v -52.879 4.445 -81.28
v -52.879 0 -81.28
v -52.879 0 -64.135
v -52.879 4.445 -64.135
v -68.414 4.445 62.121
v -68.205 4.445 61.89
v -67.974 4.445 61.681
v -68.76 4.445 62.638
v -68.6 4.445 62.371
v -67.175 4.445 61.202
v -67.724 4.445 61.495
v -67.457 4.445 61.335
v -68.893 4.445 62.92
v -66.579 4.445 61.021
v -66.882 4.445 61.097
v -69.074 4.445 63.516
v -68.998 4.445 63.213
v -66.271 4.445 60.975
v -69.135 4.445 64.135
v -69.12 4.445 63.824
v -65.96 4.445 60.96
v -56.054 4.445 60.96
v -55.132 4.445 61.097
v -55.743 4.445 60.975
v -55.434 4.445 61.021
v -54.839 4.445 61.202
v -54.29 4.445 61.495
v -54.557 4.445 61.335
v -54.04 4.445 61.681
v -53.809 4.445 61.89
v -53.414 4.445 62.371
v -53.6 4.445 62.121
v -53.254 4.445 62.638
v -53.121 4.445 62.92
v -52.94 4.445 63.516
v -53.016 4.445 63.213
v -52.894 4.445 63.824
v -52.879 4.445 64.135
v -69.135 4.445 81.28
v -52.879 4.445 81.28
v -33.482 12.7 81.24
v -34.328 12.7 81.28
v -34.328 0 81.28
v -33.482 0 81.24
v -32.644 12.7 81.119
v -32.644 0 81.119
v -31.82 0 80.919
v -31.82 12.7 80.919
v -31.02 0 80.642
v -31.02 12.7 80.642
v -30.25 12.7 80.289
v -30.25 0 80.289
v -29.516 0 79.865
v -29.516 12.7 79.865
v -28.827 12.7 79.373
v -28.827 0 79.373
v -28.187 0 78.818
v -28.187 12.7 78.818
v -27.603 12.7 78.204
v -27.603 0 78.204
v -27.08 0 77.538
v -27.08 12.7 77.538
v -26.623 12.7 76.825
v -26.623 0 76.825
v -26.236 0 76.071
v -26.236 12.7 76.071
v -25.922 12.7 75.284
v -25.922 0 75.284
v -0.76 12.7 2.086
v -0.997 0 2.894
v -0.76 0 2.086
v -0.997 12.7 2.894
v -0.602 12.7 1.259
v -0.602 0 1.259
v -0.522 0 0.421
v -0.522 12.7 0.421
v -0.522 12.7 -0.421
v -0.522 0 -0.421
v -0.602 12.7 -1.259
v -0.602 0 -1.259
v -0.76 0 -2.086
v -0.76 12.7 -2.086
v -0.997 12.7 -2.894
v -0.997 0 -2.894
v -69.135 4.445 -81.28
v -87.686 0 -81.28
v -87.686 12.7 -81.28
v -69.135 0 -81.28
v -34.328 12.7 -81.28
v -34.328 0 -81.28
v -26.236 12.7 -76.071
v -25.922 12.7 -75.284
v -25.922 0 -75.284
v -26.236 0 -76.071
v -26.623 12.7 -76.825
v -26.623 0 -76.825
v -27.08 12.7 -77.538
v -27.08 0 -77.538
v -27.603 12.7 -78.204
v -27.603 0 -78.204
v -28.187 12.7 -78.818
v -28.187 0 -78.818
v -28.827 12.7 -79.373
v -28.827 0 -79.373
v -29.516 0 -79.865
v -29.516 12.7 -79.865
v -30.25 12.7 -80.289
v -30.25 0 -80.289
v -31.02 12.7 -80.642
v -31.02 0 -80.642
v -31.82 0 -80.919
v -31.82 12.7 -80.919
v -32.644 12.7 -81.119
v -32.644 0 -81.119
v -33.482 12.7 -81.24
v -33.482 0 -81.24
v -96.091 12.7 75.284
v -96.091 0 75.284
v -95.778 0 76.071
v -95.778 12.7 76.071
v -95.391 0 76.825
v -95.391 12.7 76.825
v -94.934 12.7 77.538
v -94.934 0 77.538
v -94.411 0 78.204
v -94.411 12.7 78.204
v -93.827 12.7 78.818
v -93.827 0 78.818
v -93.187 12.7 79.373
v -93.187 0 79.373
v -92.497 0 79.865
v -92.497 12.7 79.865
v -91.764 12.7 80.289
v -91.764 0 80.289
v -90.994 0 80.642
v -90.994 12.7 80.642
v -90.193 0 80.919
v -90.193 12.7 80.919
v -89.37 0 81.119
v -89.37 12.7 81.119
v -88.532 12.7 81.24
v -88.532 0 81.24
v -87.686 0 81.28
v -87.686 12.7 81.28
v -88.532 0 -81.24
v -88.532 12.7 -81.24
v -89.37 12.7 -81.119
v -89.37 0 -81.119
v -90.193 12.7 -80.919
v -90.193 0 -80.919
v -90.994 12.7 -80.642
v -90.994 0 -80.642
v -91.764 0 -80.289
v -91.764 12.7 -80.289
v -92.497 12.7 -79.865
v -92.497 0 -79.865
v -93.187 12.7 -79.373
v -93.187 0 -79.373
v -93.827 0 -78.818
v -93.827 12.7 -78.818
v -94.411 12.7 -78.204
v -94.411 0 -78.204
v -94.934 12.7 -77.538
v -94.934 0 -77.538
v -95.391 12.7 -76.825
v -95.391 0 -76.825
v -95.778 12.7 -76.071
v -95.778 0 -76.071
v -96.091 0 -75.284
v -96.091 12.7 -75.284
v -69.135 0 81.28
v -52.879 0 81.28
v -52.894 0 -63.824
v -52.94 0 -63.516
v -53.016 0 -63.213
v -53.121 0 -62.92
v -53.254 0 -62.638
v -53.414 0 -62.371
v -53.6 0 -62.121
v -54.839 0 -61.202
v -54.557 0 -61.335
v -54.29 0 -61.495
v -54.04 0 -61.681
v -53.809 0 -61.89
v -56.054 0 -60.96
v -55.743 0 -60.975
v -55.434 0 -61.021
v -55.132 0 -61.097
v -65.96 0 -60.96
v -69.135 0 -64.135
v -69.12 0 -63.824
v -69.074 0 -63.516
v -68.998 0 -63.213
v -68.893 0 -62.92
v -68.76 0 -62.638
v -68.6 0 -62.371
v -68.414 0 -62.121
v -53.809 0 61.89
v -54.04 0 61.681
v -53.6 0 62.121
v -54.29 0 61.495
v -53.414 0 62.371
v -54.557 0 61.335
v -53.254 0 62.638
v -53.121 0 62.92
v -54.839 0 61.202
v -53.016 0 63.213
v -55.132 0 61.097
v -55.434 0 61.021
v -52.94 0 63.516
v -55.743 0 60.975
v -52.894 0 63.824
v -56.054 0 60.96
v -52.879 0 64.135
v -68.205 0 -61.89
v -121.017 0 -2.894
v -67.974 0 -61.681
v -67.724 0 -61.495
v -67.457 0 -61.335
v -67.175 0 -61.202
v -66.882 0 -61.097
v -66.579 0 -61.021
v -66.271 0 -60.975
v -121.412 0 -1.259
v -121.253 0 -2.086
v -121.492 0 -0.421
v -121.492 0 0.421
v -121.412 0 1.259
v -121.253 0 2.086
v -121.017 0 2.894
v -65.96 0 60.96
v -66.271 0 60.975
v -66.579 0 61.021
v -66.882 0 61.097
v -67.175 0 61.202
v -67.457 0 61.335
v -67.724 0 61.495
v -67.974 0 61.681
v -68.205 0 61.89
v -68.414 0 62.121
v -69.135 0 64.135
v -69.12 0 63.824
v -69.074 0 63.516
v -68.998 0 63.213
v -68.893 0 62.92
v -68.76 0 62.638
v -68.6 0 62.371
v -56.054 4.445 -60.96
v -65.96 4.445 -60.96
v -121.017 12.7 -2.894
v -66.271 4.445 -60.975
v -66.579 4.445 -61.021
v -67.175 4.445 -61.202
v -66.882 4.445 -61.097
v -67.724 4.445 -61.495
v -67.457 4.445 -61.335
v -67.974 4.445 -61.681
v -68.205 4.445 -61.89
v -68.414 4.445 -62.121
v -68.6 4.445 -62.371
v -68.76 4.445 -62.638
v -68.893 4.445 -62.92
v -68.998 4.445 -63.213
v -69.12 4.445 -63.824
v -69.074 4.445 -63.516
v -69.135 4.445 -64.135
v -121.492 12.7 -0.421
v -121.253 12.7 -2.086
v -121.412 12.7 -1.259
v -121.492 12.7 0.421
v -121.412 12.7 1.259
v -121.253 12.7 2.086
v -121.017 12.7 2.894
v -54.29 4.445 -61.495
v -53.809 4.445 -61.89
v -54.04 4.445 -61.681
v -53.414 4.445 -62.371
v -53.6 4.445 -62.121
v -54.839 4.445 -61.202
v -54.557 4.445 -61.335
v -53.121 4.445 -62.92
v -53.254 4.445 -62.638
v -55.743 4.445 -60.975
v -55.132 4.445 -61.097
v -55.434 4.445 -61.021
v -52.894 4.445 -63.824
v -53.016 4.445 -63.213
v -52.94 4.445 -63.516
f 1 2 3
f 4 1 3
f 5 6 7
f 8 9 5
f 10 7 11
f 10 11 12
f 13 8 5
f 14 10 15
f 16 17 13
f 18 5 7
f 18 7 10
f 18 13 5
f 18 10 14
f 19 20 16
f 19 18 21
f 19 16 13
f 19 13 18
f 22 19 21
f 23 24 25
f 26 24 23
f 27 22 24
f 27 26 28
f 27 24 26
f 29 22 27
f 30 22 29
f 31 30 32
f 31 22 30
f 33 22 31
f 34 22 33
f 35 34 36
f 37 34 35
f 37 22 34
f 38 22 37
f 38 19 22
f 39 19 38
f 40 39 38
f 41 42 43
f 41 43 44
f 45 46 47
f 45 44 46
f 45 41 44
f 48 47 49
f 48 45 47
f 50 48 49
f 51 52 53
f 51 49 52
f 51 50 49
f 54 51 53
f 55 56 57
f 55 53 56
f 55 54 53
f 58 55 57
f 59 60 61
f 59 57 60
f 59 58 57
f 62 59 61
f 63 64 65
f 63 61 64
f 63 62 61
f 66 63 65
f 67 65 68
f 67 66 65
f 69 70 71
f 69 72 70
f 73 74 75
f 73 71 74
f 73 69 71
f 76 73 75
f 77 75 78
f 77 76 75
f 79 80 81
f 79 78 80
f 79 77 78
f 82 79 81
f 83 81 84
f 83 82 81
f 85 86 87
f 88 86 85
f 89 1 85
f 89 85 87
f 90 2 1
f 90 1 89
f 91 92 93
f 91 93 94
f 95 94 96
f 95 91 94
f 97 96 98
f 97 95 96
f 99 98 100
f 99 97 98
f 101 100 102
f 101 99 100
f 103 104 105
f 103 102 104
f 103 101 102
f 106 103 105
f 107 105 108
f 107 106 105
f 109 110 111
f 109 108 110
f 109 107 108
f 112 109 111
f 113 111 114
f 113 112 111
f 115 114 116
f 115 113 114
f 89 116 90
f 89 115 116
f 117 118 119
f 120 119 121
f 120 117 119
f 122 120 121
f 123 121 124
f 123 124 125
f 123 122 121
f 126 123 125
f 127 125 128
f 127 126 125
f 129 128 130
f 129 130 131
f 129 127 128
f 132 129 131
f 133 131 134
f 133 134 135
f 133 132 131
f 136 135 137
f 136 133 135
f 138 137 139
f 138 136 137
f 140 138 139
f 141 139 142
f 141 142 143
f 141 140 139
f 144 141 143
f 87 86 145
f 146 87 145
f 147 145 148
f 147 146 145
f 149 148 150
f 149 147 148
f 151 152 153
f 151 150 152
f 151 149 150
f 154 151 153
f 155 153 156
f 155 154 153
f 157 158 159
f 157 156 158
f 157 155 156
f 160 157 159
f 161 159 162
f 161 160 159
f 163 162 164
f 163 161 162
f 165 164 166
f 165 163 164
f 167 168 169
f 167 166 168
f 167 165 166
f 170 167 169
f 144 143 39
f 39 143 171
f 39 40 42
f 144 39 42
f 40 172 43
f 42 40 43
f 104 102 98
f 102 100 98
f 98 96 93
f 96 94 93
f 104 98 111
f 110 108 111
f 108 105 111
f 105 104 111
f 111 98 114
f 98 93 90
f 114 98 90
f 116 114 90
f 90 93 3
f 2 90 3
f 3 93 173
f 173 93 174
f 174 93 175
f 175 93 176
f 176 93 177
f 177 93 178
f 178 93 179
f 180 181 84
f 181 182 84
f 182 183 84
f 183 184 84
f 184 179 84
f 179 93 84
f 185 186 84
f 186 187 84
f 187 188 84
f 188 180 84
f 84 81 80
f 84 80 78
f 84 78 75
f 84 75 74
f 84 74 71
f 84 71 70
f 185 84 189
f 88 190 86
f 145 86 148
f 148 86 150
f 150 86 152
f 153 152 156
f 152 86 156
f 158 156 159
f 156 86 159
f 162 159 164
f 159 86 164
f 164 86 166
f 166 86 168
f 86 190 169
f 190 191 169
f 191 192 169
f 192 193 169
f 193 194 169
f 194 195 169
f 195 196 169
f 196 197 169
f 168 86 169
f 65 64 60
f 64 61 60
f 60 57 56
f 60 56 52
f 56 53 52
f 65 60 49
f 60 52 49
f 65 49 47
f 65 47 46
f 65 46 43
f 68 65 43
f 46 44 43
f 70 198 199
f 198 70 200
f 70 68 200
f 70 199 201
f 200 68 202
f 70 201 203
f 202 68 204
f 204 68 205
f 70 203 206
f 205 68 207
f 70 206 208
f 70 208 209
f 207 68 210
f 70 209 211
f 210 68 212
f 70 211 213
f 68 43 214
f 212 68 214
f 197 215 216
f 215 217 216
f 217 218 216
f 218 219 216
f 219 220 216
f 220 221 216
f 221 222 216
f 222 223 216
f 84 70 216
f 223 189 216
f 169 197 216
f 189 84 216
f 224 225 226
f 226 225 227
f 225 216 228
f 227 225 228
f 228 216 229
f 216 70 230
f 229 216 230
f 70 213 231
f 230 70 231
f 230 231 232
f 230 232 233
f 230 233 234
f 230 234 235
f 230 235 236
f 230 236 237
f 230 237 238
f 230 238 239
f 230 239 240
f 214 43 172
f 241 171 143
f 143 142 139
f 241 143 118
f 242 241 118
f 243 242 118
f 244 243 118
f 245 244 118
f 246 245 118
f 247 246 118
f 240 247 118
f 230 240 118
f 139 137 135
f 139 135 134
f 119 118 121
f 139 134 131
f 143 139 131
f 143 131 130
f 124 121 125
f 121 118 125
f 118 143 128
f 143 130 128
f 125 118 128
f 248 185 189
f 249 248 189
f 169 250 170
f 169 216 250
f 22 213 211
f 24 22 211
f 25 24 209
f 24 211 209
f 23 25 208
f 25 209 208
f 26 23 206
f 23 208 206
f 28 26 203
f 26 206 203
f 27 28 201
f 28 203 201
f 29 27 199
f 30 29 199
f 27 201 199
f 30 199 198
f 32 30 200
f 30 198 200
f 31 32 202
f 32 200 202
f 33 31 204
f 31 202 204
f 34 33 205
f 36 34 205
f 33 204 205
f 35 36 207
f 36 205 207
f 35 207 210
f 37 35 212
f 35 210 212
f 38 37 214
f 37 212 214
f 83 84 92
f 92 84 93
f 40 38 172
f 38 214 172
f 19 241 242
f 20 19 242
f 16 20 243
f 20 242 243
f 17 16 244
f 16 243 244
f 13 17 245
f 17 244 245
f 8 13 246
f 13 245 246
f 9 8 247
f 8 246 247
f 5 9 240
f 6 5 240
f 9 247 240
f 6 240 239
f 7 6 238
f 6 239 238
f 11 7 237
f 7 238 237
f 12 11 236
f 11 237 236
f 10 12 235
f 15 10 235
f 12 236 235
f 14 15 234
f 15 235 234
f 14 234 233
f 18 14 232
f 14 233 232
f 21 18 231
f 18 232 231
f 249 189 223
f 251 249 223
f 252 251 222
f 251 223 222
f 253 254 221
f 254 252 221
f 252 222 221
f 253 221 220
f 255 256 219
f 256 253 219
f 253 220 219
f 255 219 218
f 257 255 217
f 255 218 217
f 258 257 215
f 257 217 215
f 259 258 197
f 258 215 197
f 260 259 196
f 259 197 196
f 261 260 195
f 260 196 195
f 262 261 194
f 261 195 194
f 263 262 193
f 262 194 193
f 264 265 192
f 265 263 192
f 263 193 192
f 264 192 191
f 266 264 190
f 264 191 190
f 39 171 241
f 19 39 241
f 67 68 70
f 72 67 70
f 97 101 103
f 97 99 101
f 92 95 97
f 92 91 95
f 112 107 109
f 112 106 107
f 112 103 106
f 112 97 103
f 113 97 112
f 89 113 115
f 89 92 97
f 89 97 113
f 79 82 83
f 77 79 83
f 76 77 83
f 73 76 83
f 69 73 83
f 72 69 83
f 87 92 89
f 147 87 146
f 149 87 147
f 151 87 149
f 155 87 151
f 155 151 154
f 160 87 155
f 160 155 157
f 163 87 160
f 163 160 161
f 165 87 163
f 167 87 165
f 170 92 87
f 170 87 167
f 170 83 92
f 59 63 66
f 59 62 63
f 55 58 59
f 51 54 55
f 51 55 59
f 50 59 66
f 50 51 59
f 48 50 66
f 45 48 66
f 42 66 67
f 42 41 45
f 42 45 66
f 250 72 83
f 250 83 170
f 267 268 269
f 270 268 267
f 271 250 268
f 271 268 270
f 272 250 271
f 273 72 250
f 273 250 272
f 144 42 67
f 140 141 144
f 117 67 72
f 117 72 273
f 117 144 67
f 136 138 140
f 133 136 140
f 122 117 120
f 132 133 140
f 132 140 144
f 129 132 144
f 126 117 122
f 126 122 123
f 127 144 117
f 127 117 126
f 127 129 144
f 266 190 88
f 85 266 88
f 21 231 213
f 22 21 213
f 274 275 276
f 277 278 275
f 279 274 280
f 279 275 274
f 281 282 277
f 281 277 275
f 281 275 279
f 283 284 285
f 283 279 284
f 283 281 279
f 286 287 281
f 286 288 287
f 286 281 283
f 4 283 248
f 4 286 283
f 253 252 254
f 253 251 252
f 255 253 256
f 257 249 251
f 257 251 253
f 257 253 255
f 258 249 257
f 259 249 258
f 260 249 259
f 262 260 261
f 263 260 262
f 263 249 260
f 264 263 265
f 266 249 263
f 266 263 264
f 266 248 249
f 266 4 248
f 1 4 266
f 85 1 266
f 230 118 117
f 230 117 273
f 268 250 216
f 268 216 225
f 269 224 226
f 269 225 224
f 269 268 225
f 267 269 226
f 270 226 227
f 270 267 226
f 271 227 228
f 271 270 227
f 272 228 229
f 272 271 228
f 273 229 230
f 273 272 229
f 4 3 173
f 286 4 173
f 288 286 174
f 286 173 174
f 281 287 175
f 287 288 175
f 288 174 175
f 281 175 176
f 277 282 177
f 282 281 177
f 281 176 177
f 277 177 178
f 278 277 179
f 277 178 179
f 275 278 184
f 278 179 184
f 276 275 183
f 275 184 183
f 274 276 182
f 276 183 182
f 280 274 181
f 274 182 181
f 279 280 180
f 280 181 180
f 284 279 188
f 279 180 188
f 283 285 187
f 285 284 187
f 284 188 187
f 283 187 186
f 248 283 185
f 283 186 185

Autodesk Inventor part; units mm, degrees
ref_plane "YZ Plane" through (0, 0, 0) normal (1, 0, 0) x (0, 1, 0)
ref_plane "XZ Plane" through (0, 0, 0) normal (0, 1, 0) x (-1, 0, 0)
ref_plane "XY Plane" through (0, 0, 0) normal (0, 0, 1) x (1, 0, 0)
sketch "Sketch1" plane through (0, 0, 0) normal (0, 1, 0) x (-1, 0, 0)
  line L0 (94.0269, 81.28) -> (27.9869, 81.28)
  line L1 (94.0269, -81.28) -> (27.9869, -81.28)
  line L2 (94.0269, 81.28) -> (122.0139, 0)
  line L3 (94.0269, 81.28) -> (179.9904, 81.28) construction
  line L4 (122.0139, 0) -> (94.0269, -81.28)
  line L5 (27.9869, 81.28) -> (0, 0)
  line L6 (27.9869, 81.28) -> (113.9504, 81.28) construction
  line L7 (0, 0) -> (27.9869, -81.28)
  dimension "d6" = 66.04
  dimension "d7" = 162.56
  dimension "d8" = 71
  dimension "d9" = 109
  dimension "d10" = 109
extrude "Extrusion1" add sketch "Sketch1" along normal blind 12.7
fillet "Fillet1" radius 8.89 6 edges at (-27.9869, 6.35, 81.28) (-94.0269, 6.35, 81.28) (0, 6.35, 0) (-27.9869, 6.35, -81.28) (-122.0139, 6.35, 0) (-94.0269, 6.35, -81.28)
sketch "Sketch4" plane through (0, 0, 0) normal (0, -1, 0) x (1, 0, 0)
  line L0 (-52.8789, 81.28) -> (-69.1349, 81.28)
  line L1 (-69.1349, 81.28) -> (-69.1349, 64.135)
  line L2 (-65.9599, 60.96) -> (-56.0539, 60.96)
  line L3 (-52.8789, 64.135) -> (-52.8789, 81.28)
  line L4 (-87.6858, 81.28) -> (-34.3281, 81.28) projected
  arc A0 (-56.0539, 60.96) -> (-52.8789, 64.135) centre (-56.0539, 64.135) ccw
  arc A1 (-69.1349, 64.135) -> (-65.9599, 60.96) centre (-65.9599, 64.135) ccw
  point P0 (0, 0)
  point P1 (-69.1349, 60.96)
  point P2 (-52.8789, 60.96)
  point P3 (-61.0069, 81.28)
  dimension "d28" = 16.256
  dimension "d29" = 20.32
  dimension "d32" = 3.175
extrude "Extrusion4" cut sketch "Sketch4" against normal blind 4.445
mirror "Mirror2" about plane through (0, 0, 0) normal (0, 0, 1) of "Extrusion4"
